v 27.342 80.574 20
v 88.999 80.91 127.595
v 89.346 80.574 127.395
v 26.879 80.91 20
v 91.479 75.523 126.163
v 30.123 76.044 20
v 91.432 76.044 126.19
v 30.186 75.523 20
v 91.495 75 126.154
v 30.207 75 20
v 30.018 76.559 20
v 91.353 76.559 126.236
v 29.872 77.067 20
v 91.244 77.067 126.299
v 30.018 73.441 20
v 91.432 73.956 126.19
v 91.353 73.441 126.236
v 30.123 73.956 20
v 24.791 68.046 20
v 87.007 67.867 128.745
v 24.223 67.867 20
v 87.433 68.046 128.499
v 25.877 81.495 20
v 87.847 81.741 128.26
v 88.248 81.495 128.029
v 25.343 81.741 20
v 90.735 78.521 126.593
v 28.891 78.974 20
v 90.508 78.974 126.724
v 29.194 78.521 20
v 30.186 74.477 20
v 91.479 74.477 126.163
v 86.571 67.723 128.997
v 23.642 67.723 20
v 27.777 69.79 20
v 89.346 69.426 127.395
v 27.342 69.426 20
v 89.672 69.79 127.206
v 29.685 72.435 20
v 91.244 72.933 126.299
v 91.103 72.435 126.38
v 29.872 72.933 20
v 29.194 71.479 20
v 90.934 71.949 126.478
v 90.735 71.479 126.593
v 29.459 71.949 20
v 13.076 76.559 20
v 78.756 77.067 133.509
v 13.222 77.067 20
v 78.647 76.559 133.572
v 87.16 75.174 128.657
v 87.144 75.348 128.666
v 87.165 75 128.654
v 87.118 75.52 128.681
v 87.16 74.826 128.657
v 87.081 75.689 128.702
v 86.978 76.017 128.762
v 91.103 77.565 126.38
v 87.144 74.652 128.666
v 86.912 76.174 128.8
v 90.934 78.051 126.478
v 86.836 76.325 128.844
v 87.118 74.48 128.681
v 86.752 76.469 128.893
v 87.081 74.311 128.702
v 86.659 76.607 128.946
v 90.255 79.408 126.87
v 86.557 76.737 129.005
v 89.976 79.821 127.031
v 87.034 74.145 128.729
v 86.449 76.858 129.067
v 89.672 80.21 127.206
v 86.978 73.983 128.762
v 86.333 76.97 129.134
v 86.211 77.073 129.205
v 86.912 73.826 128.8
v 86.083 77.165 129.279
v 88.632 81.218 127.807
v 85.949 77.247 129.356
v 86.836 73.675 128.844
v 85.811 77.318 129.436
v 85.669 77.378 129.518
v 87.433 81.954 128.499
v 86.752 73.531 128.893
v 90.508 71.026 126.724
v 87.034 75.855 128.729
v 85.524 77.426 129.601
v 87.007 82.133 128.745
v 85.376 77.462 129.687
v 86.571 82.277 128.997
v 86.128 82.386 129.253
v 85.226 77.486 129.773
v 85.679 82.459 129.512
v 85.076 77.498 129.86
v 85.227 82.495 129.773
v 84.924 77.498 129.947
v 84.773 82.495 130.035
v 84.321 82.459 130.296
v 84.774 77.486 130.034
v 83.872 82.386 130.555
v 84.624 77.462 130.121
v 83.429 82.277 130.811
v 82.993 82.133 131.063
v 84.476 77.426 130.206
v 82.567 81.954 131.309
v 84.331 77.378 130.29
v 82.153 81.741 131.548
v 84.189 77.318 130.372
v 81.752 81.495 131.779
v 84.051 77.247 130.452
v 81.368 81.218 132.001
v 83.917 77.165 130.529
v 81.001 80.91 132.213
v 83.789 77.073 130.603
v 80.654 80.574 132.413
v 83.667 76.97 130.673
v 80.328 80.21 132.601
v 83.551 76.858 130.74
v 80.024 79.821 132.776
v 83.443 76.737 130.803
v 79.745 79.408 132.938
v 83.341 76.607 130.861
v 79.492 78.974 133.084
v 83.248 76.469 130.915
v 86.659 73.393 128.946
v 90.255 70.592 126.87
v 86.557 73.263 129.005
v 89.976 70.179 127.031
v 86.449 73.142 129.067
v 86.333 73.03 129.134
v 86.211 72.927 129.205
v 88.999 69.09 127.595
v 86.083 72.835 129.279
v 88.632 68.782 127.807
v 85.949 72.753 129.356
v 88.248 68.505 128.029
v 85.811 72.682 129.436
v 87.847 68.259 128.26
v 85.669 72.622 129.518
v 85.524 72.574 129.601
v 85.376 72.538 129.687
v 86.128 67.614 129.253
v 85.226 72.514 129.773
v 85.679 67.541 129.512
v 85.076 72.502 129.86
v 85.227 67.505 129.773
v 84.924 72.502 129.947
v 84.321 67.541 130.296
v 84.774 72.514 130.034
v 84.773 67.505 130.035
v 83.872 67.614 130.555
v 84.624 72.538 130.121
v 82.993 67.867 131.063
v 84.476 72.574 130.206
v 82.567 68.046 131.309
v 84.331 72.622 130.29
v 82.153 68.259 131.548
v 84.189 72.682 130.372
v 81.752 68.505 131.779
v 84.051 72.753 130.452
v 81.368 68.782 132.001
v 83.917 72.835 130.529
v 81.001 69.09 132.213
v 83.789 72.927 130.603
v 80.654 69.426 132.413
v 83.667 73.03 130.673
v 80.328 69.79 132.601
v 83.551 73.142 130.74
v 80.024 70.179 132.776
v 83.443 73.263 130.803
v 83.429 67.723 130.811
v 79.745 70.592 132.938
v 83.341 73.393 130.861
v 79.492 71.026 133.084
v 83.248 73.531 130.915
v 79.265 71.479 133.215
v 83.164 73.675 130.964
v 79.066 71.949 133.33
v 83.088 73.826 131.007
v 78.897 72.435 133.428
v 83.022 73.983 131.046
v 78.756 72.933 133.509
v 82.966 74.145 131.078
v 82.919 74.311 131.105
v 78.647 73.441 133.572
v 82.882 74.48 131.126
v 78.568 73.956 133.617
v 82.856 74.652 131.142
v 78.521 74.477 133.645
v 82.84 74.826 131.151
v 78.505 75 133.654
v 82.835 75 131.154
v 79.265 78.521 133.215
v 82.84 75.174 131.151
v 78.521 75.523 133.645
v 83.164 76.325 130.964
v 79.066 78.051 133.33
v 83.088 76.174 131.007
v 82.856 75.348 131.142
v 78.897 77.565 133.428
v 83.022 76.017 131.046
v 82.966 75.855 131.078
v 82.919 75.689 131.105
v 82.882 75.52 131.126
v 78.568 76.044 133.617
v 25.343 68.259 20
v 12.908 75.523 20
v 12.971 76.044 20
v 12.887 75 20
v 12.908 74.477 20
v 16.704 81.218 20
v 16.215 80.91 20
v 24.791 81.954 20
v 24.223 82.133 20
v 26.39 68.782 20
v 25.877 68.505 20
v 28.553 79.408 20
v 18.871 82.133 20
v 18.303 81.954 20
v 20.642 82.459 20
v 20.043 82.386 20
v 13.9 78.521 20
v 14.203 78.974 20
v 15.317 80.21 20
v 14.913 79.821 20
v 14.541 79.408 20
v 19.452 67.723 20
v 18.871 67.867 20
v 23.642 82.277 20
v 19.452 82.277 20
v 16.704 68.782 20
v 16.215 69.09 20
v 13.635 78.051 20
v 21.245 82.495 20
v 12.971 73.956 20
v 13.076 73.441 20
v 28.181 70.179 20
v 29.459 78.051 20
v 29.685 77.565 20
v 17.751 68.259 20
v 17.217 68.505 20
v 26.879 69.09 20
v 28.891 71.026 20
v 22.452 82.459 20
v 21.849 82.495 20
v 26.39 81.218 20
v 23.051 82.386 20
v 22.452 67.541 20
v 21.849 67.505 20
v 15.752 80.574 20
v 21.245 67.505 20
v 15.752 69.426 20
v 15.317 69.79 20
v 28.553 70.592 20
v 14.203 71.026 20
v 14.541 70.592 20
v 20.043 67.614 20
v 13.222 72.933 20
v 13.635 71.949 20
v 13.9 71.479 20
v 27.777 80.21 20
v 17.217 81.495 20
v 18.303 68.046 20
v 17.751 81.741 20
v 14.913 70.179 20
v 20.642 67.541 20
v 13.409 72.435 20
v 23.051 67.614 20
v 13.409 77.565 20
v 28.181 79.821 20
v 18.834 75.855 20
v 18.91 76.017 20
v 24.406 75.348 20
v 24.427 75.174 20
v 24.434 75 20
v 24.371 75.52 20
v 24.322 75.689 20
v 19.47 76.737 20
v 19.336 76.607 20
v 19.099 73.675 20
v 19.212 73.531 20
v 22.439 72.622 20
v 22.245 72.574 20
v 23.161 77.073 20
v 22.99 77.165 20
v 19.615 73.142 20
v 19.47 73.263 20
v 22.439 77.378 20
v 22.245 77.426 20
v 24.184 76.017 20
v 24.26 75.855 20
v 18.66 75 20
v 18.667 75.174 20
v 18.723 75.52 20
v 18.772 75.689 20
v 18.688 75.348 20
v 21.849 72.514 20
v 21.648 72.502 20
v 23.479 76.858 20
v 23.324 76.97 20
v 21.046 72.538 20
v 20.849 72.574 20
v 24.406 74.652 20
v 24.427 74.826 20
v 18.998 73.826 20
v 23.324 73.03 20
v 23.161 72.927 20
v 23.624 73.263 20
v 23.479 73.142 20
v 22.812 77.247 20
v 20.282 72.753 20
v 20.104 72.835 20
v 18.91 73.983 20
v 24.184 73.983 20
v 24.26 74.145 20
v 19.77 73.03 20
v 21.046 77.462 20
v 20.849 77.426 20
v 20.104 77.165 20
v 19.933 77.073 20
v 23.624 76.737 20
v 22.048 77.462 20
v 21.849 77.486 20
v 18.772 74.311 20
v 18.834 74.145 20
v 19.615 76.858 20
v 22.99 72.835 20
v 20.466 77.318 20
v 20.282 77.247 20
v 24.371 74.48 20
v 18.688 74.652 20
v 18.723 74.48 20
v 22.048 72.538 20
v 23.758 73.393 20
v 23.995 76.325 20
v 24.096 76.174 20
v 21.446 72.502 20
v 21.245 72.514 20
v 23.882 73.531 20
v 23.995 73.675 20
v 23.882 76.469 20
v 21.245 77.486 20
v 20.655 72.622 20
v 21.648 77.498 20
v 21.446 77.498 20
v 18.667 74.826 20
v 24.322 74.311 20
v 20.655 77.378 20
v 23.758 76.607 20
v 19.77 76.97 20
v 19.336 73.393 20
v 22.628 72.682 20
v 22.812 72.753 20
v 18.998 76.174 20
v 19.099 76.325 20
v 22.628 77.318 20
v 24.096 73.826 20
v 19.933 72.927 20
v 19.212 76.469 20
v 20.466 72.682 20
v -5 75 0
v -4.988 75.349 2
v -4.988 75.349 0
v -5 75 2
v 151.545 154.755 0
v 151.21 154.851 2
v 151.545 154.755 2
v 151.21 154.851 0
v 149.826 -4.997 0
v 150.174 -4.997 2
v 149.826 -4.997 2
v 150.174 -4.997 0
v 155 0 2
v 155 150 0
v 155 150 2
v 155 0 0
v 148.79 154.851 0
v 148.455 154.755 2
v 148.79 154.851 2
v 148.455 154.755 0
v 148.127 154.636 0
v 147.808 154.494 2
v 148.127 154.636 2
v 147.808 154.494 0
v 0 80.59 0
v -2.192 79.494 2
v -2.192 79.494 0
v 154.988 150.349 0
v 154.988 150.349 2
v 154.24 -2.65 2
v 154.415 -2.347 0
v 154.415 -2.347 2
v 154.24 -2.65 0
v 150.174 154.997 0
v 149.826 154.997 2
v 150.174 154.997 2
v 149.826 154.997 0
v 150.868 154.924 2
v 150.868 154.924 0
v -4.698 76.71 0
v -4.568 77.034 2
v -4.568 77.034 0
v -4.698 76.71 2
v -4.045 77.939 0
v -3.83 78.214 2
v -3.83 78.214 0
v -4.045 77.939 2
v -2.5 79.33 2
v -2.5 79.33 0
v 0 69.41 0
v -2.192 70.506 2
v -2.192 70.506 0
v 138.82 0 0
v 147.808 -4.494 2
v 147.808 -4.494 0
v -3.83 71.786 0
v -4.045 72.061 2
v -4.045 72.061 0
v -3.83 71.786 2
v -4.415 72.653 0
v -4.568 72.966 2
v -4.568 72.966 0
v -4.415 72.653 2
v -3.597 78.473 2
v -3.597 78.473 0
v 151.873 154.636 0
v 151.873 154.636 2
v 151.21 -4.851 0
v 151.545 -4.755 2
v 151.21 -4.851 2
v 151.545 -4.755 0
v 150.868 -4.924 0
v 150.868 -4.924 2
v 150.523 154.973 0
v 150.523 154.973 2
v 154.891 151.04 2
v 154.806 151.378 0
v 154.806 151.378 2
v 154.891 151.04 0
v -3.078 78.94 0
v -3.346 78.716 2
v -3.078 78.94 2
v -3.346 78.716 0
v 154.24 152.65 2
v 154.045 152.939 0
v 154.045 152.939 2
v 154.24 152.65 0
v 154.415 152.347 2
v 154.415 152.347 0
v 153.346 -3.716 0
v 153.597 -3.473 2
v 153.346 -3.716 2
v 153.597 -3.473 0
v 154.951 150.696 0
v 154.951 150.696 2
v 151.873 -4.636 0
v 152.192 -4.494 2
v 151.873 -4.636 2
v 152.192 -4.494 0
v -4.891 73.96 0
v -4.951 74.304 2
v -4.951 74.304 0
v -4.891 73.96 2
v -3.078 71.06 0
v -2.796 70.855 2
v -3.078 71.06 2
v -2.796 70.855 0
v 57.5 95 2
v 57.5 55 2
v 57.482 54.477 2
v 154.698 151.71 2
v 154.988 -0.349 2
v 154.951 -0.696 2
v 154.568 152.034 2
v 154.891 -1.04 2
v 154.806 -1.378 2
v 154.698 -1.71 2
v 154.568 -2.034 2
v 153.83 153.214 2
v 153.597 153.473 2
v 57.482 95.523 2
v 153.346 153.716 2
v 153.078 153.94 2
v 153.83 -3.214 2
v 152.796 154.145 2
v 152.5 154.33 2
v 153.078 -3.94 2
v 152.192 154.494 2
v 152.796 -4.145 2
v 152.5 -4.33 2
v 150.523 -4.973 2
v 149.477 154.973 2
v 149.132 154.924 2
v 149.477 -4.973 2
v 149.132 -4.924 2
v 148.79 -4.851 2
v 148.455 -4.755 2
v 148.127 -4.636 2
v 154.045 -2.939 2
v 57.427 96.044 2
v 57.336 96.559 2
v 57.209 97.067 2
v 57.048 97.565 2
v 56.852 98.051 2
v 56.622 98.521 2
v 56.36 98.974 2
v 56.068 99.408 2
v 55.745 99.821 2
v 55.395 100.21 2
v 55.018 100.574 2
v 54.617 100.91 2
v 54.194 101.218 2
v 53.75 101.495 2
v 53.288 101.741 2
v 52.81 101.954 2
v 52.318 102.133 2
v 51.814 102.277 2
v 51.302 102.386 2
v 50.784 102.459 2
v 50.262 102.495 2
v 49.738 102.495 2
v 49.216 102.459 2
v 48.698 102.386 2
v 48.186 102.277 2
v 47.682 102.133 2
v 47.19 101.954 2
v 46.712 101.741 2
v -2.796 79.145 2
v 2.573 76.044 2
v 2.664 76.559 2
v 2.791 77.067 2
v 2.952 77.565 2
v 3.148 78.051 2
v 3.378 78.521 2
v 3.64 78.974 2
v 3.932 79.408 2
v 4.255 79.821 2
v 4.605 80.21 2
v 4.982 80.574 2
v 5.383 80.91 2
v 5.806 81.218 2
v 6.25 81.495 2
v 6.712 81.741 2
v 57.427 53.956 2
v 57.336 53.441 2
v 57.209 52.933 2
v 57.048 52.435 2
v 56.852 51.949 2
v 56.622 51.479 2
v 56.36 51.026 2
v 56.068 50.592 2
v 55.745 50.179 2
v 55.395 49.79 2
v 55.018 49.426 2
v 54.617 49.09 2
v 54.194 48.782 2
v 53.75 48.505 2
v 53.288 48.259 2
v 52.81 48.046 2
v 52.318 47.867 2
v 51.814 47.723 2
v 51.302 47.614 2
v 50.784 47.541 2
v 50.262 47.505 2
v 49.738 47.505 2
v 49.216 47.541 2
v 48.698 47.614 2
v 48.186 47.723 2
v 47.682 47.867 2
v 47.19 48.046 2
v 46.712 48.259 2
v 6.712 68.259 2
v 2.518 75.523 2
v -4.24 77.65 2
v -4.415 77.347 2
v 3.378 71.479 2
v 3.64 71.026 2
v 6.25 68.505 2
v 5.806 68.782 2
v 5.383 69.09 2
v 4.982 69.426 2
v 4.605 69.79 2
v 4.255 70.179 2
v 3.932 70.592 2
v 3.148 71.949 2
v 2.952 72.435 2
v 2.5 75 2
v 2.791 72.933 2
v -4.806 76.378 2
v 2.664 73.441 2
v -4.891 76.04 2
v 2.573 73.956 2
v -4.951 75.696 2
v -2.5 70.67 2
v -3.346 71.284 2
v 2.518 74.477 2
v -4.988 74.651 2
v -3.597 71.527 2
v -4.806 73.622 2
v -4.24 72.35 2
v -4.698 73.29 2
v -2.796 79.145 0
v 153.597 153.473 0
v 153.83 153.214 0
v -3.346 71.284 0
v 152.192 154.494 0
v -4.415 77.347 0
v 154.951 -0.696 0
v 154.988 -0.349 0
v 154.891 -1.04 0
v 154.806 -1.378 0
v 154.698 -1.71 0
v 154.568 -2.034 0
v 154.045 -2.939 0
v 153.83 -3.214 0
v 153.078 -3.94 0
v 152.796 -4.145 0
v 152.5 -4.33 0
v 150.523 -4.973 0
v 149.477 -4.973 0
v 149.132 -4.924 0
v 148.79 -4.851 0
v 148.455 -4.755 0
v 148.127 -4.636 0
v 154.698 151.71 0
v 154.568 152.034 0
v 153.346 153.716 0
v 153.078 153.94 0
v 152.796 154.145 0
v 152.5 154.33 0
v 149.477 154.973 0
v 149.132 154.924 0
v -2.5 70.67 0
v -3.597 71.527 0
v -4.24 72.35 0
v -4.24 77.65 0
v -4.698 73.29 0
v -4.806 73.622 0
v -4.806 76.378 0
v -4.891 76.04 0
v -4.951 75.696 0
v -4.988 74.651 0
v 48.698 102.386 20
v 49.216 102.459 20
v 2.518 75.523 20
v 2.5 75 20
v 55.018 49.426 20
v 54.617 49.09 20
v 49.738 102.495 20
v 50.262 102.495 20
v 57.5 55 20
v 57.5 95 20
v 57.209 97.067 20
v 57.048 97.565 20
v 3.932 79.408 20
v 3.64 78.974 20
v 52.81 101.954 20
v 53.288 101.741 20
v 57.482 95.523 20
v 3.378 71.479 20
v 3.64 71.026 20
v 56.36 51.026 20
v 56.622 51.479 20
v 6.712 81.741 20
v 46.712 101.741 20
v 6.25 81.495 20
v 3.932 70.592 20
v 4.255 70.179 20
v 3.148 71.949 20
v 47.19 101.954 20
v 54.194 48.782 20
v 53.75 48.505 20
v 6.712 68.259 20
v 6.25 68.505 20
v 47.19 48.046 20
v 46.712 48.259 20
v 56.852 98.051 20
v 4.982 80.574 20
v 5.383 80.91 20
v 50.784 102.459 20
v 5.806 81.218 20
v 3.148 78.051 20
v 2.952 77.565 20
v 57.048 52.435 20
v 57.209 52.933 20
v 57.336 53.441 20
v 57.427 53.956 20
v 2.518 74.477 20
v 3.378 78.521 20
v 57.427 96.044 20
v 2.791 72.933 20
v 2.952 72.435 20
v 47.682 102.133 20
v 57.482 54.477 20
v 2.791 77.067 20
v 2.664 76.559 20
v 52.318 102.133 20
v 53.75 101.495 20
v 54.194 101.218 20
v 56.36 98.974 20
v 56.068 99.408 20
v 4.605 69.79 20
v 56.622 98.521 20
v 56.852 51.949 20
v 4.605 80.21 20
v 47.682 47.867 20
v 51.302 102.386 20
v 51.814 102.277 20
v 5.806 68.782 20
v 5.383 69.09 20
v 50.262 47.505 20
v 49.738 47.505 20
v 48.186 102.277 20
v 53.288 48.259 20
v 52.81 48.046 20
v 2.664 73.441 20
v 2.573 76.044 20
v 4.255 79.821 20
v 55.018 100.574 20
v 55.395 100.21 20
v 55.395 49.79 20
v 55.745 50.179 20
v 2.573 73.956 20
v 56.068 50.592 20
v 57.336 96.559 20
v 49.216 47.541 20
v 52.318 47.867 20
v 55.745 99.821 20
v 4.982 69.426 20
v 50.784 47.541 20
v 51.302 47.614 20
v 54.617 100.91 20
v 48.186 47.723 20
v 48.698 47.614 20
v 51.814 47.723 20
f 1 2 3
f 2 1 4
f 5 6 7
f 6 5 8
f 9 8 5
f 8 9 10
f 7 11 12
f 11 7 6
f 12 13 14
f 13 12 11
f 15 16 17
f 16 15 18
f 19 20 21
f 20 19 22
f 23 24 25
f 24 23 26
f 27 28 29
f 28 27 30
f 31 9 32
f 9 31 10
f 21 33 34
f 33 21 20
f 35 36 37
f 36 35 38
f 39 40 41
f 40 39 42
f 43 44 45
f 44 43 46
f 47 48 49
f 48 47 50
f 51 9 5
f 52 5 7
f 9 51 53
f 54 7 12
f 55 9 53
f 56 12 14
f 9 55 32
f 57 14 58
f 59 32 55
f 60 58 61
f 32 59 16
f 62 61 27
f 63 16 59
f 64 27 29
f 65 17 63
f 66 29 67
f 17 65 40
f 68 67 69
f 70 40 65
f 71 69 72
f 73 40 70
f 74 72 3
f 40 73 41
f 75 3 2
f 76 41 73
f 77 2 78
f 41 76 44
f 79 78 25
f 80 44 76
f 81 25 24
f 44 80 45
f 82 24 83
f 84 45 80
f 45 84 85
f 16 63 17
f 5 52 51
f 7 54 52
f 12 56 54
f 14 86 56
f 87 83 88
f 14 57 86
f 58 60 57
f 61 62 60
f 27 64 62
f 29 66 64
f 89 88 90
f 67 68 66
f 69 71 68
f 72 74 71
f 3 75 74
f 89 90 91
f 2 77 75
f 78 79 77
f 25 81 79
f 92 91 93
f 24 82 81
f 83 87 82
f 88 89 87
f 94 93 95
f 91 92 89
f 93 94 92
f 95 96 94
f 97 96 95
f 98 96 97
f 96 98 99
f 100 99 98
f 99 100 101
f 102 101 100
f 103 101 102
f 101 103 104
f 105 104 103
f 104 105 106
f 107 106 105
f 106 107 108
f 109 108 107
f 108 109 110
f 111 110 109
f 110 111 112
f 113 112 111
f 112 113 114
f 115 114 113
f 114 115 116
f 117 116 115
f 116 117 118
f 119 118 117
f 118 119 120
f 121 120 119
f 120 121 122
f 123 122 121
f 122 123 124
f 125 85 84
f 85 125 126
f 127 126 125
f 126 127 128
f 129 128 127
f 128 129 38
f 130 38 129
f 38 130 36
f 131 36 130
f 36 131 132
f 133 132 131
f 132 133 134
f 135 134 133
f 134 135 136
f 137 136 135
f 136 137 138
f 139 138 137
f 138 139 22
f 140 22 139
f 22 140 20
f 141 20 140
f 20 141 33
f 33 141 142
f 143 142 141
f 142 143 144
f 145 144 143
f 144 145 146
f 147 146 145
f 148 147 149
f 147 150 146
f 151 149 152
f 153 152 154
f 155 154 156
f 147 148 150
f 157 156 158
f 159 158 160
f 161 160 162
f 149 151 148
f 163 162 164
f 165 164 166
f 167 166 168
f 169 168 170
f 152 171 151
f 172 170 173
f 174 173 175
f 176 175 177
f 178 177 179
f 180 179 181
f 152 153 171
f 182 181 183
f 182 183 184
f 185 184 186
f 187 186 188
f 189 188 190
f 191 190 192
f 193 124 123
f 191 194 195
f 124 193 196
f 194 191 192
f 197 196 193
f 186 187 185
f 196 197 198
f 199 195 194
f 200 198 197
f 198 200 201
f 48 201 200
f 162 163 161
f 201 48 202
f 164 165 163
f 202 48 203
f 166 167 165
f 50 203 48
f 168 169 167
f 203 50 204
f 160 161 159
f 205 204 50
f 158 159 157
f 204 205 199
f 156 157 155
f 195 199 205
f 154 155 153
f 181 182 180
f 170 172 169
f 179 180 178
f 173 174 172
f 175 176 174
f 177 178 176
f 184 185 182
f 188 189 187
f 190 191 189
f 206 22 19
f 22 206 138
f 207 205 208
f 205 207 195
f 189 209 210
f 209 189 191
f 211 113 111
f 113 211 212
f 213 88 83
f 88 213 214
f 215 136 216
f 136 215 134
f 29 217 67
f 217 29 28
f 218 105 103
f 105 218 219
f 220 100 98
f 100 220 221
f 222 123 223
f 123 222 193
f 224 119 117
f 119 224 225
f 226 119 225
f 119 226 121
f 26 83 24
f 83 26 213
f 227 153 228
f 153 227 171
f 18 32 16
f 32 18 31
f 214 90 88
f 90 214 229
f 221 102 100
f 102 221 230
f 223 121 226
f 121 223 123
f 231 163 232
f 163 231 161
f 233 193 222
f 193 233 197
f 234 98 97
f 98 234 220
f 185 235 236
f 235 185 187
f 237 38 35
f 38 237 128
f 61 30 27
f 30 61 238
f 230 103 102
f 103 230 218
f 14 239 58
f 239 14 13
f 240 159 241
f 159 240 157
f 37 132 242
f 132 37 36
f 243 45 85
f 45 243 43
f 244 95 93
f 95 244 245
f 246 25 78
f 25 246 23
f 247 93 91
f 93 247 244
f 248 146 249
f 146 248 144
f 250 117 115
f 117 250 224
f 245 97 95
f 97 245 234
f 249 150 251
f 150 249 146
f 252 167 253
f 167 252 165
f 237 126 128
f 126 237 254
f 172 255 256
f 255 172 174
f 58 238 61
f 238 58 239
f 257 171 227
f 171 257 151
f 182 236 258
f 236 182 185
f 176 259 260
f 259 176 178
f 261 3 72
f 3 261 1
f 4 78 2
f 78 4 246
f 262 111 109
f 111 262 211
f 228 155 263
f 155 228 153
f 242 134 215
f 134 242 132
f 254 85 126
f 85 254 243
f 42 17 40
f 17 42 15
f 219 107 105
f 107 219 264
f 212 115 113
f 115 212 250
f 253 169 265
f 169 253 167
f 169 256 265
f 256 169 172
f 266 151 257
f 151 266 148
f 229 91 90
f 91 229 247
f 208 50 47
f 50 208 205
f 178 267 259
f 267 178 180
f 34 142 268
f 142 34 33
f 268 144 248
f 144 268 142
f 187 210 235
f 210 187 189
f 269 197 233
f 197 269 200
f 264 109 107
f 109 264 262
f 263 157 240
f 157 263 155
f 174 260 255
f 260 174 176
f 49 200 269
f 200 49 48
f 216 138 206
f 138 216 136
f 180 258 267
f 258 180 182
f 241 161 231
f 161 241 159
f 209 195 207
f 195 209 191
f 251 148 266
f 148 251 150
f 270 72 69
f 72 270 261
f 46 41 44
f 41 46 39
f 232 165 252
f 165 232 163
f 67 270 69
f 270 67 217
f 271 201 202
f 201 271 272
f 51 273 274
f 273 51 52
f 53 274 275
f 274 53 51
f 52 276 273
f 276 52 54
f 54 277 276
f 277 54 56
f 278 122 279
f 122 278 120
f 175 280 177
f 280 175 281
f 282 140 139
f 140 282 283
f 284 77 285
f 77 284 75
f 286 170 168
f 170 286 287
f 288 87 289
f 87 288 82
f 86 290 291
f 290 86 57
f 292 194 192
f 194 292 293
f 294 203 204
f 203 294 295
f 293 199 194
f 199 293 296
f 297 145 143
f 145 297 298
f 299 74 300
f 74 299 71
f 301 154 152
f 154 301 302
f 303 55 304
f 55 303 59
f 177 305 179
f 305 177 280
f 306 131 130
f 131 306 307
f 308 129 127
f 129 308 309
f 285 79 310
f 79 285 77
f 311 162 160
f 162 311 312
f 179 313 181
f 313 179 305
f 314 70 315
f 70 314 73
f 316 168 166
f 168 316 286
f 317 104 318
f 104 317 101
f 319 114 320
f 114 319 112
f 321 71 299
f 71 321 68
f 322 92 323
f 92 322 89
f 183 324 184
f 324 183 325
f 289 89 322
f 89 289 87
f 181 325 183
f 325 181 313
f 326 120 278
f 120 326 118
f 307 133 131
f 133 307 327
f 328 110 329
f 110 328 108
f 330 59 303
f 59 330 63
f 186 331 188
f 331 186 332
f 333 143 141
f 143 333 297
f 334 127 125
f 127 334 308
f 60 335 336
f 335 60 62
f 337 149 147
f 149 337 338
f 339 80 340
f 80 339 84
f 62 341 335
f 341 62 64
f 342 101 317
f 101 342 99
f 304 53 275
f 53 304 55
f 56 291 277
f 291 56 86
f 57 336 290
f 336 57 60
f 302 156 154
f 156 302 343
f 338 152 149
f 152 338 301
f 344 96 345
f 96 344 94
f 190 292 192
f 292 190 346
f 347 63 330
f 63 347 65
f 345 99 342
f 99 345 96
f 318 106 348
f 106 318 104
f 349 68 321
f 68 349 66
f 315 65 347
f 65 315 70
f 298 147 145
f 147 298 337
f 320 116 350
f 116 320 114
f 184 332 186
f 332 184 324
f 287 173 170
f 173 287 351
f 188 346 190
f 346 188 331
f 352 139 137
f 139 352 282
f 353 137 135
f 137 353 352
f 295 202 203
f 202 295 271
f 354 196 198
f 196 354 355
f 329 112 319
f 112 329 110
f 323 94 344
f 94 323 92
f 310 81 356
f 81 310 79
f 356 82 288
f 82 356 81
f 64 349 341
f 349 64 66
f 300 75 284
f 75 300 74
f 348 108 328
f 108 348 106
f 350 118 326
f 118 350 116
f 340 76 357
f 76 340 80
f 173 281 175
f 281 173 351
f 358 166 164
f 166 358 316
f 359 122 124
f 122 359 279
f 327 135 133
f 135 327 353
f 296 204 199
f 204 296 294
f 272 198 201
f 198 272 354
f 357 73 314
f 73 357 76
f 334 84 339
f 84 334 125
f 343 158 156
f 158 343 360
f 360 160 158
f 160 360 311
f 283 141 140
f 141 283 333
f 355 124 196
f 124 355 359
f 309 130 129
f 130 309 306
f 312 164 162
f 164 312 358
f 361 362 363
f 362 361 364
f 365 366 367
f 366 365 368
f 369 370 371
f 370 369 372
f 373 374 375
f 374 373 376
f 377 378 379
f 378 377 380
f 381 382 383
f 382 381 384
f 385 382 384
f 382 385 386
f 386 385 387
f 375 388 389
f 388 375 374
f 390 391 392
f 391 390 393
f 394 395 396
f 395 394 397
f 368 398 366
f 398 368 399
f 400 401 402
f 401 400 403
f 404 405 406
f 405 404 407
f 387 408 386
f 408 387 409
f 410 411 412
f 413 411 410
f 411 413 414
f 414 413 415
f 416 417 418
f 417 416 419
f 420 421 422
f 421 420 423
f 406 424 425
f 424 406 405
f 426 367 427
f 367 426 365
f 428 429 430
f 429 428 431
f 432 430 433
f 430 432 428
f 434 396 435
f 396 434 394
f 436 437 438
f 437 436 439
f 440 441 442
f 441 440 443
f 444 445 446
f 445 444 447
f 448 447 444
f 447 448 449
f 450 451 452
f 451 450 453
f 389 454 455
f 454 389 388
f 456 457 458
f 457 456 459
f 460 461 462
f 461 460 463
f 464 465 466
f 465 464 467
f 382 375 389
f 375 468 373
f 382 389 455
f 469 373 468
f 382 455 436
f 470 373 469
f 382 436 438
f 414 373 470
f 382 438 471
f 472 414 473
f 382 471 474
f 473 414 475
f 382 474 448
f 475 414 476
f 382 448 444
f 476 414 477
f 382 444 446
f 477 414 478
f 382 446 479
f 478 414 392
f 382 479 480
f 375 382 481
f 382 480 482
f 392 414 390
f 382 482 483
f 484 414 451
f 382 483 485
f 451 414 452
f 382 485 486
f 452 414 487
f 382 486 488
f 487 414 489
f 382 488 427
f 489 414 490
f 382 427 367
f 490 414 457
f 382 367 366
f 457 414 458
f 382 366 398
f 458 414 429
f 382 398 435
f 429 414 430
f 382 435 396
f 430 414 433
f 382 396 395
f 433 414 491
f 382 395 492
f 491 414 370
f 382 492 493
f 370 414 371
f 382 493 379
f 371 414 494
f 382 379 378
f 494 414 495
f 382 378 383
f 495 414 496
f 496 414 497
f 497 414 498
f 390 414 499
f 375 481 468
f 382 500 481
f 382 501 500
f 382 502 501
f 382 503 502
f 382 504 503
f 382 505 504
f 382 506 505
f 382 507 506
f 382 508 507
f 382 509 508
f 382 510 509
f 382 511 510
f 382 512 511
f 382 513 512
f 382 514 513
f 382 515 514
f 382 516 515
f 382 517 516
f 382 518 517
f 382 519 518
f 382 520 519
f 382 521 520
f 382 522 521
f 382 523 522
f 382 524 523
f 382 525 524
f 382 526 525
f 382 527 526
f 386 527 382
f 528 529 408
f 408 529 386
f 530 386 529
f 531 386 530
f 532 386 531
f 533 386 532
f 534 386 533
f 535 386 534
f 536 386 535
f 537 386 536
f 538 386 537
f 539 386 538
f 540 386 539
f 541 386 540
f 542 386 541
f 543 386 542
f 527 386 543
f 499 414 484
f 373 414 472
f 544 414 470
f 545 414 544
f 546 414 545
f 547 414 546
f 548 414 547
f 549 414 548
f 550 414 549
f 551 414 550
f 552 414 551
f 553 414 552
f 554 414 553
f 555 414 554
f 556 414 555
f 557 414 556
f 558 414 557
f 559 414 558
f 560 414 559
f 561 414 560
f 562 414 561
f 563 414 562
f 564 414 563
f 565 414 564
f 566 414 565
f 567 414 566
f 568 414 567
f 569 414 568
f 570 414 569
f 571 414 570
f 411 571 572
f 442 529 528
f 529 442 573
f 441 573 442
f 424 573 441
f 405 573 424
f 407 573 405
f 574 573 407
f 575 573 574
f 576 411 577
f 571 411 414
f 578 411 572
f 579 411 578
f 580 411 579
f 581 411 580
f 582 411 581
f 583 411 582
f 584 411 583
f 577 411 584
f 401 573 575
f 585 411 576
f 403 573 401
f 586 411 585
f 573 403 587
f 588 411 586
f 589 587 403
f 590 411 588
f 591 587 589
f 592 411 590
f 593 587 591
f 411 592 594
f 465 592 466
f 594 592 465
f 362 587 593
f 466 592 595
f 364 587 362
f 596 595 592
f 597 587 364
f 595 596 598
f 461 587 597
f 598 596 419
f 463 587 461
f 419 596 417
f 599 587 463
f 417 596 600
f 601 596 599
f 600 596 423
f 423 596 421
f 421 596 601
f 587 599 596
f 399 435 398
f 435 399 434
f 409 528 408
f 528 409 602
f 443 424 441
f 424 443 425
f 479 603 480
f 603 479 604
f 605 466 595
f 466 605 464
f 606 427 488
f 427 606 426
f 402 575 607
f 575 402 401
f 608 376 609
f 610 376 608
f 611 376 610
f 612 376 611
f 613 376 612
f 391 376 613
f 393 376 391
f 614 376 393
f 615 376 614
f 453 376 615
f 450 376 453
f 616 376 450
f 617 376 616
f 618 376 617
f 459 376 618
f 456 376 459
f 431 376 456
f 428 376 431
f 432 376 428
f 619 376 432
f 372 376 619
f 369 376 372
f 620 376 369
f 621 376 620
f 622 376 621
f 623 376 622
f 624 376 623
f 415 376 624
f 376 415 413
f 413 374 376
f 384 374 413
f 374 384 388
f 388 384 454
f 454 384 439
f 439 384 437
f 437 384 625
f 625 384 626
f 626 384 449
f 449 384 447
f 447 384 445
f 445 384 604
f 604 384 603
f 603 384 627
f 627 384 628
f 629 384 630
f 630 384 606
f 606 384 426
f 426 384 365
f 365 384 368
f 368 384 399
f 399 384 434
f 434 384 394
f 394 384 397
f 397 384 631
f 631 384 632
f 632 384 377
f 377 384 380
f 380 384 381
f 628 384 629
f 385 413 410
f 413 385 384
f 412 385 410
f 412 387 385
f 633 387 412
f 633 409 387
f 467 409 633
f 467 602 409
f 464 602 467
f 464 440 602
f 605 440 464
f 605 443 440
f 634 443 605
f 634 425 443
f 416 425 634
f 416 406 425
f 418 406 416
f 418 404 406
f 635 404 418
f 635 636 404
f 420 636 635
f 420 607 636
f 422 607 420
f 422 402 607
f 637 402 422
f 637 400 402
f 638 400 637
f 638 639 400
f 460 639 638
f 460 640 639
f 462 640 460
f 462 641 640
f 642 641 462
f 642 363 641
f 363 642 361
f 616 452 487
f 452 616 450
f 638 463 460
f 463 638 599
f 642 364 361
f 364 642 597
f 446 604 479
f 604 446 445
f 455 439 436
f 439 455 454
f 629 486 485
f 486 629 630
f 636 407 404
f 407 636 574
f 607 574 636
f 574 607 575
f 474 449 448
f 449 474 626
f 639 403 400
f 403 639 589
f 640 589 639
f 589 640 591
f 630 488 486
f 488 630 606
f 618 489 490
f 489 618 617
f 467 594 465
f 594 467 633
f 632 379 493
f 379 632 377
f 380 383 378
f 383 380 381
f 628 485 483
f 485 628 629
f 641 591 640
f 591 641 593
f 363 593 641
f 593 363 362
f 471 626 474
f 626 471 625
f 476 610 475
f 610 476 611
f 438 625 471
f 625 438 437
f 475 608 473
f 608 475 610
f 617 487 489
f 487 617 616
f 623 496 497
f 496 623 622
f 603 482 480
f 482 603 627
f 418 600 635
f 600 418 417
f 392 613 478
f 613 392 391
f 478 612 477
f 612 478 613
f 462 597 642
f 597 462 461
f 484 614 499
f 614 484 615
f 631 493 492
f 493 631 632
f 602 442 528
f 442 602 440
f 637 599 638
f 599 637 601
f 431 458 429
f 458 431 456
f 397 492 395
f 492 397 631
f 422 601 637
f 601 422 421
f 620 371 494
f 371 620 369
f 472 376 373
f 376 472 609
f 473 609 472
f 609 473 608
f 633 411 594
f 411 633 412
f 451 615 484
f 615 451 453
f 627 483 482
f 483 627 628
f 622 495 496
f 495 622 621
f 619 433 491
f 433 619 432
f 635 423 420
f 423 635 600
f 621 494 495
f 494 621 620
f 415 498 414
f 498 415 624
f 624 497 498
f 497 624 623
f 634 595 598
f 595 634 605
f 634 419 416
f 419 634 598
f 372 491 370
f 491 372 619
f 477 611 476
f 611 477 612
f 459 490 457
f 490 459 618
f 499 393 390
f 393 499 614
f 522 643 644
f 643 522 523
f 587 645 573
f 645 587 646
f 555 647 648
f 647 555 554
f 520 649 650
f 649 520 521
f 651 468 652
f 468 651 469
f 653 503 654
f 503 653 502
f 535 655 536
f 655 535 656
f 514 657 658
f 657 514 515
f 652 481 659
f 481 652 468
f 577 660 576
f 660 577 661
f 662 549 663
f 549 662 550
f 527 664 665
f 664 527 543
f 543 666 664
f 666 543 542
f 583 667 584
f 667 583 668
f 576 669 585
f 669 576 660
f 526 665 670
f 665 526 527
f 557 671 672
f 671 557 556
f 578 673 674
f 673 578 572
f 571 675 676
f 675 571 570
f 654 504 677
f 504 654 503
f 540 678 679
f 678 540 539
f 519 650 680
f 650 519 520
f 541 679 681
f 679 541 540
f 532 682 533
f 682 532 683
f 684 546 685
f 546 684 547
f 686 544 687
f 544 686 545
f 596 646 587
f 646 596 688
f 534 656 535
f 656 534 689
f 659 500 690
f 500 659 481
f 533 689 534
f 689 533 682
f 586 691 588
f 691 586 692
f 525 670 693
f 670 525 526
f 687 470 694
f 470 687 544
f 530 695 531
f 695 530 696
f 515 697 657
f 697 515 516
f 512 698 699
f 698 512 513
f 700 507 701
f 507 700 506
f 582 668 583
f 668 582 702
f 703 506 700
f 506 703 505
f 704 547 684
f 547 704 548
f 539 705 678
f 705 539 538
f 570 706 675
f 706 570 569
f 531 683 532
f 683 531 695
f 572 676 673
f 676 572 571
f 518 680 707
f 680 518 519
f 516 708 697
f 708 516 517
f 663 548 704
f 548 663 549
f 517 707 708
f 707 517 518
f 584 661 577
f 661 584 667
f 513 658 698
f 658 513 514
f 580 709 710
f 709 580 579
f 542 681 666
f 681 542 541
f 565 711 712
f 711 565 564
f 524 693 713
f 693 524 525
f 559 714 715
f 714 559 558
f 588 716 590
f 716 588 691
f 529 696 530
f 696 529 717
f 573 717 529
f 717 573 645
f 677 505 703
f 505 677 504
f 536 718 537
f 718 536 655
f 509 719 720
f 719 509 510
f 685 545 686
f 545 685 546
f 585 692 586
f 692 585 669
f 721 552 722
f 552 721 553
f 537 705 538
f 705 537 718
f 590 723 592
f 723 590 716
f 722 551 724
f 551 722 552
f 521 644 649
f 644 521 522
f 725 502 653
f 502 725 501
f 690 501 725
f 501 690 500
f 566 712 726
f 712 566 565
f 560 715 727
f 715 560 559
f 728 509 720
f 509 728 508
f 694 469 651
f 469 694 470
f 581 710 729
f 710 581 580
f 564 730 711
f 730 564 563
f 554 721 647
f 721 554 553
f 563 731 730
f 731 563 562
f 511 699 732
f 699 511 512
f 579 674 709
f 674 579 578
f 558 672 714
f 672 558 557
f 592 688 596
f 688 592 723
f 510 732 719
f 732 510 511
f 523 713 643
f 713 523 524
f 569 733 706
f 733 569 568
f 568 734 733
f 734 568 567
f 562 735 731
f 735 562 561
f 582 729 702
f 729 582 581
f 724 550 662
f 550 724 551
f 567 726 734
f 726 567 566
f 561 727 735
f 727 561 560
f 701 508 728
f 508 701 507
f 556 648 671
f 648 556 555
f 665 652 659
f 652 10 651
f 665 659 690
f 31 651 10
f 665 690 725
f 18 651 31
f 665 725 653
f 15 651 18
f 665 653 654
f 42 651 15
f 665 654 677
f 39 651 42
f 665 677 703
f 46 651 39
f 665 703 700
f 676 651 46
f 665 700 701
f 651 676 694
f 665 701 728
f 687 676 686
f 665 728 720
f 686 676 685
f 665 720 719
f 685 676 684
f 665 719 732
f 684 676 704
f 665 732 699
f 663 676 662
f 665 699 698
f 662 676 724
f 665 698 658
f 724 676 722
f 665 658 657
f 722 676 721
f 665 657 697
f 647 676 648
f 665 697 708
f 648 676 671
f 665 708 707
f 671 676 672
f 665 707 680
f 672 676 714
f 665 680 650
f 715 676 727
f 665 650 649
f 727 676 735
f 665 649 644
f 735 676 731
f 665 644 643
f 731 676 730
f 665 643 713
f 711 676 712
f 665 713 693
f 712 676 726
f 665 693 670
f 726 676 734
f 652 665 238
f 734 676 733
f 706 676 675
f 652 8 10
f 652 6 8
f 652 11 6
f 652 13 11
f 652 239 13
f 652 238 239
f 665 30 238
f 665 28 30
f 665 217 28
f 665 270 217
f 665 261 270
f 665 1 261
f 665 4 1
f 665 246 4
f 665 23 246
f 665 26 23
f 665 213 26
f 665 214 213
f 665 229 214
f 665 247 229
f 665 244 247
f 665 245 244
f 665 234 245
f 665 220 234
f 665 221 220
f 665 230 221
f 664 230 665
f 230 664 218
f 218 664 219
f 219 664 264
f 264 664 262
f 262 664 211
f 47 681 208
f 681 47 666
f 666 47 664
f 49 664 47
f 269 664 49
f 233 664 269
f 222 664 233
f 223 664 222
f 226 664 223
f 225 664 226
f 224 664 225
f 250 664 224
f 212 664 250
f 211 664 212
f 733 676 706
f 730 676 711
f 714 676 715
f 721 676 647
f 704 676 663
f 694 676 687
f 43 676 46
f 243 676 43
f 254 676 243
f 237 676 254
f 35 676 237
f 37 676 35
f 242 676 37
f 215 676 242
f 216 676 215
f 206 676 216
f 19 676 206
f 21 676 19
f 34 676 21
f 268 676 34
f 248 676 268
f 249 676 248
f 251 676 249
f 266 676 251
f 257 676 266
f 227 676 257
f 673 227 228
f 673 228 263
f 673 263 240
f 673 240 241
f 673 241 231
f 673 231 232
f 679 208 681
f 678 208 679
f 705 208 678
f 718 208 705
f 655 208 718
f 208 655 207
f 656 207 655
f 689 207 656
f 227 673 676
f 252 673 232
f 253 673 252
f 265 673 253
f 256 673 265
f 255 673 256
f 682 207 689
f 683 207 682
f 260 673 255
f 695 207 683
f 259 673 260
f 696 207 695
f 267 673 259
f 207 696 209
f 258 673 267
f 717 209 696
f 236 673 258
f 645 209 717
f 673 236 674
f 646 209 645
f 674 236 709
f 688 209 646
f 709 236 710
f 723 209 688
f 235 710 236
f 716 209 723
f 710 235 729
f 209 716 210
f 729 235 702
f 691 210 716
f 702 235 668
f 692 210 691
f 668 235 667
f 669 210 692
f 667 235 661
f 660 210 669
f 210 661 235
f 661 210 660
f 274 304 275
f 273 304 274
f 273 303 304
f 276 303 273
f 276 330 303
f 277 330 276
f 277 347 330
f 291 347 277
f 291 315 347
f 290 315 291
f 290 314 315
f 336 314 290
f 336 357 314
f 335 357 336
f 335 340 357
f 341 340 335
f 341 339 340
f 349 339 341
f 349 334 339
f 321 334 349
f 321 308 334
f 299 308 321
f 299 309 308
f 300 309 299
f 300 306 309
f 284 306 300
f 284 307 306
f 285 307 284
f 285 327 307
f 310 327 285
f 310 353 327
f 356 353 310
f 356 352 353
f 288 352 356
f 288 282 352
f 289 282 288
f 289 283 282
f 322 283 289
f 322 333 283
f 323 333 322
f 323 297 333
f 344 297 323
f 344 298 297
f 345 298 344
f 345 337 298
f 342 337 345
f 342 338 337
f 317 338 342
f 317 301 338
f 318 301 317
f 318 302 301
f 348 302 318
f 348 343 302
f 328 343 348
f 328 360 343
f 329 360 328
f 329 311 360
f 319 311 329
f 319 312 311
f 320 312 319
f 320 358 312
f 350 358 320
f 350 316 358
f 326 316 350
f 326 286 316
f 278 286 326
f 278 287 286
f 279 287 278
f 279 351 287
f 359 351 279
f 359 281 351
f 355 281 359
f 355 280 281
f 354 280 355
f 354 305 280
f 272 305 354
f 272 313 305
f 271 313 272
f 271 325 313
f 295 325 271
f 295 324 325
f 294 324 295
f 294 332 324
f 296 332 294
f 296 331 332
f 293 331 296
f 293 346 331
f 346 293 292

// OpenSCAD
angle=60;
$fn=90;
difference() {
    union() {
        linear_extrude(height=2) {
            difference() {
                hull() {
                    translate([0,75,0]) circle(r=5);
                    translate([150,0,0]) circle(r=5);
                    translate([150,150,0]) circle(r=5);
                }
            }
        }
        translate([10,75,0]) rotate([0,90-angle,0]) difference() {
            cylinder(d=15,h=150);
            cylinder(d=5,h=150);
        }
        linear_extrude(height=20) {
            hull() {
                translate([10,75,0]) circle(d=15);
                translate([50,55,0]) circle(d=15);
                translate([50,95,0]) circle(d=15);
            }
        }
    }
    translate([0,0,-200]) cube([200,200,200]);
}
